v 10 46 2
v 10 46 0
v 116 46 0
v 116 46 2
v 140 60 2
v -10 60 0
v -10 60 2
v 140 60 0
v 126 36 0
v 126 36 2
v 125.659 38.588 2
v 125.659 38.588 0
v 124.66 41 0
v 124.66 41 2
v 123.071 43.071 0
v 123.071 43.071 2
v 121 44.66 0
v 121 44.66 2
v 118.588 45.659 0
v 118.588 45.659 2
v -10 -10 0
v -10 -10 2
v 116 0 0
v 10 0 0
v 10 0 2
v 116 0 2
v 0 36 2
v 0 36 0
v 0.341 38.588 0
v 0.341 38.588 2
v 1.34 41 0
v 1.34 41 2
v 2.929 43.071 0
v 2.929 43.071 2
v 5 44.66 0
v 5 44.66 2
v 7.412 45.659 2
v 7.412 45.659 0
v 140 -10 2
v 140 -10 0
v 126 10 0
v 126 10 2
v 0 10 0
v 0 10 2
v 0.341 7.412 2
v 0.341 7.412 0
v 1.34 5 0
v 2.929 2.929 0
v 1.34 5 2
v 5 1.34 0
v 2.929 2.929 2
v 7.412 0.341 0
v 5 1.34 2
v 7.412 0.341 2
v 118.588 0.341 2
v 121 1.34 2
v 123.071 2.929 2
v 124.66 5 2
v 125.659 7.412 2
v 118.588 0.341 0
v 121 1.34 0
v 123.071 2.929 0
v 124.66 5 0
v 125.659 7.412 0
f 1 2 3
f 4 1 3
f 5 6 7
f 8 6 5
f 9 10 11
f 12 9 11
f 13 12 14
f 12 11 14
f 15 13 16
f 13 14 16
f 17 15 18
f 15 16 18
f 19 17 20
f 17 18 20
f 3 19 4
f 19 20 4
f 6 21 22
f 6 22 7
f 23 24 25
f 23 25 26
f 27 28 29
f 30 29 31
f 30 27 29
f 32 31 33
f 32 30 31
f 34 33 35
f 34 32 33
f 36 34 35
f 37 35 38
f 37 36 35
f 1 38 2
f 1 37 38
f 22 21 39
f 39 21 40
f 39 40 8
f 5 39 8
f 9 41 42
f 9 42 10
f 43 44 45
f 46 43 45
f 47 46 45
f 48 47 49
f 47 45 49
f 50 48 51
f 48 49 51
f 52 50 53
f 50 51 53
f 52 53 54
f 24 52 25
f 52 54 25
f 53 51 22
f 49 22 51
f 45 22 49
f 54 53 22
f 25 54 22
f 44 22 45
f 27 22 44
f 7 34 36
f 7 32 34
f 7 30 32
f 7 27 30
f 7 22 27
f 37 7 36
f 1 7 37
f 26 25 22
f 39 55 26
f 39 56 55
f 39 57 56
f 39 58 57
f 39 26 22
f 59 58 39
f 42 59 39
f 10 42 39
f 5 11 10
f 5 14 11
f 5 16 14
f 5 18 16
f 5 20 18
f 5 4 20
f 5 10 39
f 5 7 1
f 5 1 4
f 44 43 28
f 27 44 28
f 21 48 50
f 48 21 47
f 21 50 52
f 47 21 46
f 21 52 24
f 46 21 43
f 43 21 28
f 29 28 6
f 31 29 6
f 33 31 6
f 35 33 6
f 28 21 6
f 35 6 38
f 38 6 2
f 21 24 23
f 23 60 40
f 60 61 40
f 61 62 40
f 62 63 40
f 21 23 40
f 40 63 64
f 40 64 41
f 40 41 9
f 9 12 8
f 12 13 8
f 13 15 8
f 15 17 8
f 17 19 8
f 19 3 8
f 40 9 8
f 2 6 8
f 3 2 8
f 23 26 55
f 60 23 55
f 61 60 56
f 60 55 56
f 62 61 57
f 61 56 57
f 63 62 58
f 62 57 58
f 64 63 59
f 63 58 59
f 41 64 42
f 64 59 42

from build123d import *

# Parameters (mm, degrees)
BOX003_W     = 126
BOX003_H     = 46
BOX003_DEPTH = 10
FILLET005_R  = 10
BOX004_W     = 150
BOX004_H     = 70
BOX004_DEPTH = 2


with BuildPart() as fillet005:
    # Box003 → Box003 (new body)
    with BuildSketch(Plane.XY):
        with Locations((63, 23)):
            Rectangle(BOX003_W, BOX003_H)
    extrude(amount=BOX003_DEPTH)

    # Fillet005
    fillet005_edges = [fillet005.edges().sort_by_distance(p)[0] for p in [
        (0, 0, 5),
        (0, 46, 5),
        (126, 0, 5),
        (126, 46, 5),
    ]]
    fillet(fillet005_edges, radius=FILLET005_R)


with BuildPart() as cut001:
    # Box004 → Box004 (new body)
    with BuildSketch(Plane(origin=(-10, -10, 0), x_dir=(1, 0, 0), z_dir=(0, 0, 1))):
        with Locations((75, 35)):
            Rectangle(BOX004_W, BOX004_H)
    extrude(amount=BOX004_DEPTH)

    # Cut001: cut Fillet005
    add(fillet005.part, mode=Mode.SUBTRACT)


solid = cut001.part
